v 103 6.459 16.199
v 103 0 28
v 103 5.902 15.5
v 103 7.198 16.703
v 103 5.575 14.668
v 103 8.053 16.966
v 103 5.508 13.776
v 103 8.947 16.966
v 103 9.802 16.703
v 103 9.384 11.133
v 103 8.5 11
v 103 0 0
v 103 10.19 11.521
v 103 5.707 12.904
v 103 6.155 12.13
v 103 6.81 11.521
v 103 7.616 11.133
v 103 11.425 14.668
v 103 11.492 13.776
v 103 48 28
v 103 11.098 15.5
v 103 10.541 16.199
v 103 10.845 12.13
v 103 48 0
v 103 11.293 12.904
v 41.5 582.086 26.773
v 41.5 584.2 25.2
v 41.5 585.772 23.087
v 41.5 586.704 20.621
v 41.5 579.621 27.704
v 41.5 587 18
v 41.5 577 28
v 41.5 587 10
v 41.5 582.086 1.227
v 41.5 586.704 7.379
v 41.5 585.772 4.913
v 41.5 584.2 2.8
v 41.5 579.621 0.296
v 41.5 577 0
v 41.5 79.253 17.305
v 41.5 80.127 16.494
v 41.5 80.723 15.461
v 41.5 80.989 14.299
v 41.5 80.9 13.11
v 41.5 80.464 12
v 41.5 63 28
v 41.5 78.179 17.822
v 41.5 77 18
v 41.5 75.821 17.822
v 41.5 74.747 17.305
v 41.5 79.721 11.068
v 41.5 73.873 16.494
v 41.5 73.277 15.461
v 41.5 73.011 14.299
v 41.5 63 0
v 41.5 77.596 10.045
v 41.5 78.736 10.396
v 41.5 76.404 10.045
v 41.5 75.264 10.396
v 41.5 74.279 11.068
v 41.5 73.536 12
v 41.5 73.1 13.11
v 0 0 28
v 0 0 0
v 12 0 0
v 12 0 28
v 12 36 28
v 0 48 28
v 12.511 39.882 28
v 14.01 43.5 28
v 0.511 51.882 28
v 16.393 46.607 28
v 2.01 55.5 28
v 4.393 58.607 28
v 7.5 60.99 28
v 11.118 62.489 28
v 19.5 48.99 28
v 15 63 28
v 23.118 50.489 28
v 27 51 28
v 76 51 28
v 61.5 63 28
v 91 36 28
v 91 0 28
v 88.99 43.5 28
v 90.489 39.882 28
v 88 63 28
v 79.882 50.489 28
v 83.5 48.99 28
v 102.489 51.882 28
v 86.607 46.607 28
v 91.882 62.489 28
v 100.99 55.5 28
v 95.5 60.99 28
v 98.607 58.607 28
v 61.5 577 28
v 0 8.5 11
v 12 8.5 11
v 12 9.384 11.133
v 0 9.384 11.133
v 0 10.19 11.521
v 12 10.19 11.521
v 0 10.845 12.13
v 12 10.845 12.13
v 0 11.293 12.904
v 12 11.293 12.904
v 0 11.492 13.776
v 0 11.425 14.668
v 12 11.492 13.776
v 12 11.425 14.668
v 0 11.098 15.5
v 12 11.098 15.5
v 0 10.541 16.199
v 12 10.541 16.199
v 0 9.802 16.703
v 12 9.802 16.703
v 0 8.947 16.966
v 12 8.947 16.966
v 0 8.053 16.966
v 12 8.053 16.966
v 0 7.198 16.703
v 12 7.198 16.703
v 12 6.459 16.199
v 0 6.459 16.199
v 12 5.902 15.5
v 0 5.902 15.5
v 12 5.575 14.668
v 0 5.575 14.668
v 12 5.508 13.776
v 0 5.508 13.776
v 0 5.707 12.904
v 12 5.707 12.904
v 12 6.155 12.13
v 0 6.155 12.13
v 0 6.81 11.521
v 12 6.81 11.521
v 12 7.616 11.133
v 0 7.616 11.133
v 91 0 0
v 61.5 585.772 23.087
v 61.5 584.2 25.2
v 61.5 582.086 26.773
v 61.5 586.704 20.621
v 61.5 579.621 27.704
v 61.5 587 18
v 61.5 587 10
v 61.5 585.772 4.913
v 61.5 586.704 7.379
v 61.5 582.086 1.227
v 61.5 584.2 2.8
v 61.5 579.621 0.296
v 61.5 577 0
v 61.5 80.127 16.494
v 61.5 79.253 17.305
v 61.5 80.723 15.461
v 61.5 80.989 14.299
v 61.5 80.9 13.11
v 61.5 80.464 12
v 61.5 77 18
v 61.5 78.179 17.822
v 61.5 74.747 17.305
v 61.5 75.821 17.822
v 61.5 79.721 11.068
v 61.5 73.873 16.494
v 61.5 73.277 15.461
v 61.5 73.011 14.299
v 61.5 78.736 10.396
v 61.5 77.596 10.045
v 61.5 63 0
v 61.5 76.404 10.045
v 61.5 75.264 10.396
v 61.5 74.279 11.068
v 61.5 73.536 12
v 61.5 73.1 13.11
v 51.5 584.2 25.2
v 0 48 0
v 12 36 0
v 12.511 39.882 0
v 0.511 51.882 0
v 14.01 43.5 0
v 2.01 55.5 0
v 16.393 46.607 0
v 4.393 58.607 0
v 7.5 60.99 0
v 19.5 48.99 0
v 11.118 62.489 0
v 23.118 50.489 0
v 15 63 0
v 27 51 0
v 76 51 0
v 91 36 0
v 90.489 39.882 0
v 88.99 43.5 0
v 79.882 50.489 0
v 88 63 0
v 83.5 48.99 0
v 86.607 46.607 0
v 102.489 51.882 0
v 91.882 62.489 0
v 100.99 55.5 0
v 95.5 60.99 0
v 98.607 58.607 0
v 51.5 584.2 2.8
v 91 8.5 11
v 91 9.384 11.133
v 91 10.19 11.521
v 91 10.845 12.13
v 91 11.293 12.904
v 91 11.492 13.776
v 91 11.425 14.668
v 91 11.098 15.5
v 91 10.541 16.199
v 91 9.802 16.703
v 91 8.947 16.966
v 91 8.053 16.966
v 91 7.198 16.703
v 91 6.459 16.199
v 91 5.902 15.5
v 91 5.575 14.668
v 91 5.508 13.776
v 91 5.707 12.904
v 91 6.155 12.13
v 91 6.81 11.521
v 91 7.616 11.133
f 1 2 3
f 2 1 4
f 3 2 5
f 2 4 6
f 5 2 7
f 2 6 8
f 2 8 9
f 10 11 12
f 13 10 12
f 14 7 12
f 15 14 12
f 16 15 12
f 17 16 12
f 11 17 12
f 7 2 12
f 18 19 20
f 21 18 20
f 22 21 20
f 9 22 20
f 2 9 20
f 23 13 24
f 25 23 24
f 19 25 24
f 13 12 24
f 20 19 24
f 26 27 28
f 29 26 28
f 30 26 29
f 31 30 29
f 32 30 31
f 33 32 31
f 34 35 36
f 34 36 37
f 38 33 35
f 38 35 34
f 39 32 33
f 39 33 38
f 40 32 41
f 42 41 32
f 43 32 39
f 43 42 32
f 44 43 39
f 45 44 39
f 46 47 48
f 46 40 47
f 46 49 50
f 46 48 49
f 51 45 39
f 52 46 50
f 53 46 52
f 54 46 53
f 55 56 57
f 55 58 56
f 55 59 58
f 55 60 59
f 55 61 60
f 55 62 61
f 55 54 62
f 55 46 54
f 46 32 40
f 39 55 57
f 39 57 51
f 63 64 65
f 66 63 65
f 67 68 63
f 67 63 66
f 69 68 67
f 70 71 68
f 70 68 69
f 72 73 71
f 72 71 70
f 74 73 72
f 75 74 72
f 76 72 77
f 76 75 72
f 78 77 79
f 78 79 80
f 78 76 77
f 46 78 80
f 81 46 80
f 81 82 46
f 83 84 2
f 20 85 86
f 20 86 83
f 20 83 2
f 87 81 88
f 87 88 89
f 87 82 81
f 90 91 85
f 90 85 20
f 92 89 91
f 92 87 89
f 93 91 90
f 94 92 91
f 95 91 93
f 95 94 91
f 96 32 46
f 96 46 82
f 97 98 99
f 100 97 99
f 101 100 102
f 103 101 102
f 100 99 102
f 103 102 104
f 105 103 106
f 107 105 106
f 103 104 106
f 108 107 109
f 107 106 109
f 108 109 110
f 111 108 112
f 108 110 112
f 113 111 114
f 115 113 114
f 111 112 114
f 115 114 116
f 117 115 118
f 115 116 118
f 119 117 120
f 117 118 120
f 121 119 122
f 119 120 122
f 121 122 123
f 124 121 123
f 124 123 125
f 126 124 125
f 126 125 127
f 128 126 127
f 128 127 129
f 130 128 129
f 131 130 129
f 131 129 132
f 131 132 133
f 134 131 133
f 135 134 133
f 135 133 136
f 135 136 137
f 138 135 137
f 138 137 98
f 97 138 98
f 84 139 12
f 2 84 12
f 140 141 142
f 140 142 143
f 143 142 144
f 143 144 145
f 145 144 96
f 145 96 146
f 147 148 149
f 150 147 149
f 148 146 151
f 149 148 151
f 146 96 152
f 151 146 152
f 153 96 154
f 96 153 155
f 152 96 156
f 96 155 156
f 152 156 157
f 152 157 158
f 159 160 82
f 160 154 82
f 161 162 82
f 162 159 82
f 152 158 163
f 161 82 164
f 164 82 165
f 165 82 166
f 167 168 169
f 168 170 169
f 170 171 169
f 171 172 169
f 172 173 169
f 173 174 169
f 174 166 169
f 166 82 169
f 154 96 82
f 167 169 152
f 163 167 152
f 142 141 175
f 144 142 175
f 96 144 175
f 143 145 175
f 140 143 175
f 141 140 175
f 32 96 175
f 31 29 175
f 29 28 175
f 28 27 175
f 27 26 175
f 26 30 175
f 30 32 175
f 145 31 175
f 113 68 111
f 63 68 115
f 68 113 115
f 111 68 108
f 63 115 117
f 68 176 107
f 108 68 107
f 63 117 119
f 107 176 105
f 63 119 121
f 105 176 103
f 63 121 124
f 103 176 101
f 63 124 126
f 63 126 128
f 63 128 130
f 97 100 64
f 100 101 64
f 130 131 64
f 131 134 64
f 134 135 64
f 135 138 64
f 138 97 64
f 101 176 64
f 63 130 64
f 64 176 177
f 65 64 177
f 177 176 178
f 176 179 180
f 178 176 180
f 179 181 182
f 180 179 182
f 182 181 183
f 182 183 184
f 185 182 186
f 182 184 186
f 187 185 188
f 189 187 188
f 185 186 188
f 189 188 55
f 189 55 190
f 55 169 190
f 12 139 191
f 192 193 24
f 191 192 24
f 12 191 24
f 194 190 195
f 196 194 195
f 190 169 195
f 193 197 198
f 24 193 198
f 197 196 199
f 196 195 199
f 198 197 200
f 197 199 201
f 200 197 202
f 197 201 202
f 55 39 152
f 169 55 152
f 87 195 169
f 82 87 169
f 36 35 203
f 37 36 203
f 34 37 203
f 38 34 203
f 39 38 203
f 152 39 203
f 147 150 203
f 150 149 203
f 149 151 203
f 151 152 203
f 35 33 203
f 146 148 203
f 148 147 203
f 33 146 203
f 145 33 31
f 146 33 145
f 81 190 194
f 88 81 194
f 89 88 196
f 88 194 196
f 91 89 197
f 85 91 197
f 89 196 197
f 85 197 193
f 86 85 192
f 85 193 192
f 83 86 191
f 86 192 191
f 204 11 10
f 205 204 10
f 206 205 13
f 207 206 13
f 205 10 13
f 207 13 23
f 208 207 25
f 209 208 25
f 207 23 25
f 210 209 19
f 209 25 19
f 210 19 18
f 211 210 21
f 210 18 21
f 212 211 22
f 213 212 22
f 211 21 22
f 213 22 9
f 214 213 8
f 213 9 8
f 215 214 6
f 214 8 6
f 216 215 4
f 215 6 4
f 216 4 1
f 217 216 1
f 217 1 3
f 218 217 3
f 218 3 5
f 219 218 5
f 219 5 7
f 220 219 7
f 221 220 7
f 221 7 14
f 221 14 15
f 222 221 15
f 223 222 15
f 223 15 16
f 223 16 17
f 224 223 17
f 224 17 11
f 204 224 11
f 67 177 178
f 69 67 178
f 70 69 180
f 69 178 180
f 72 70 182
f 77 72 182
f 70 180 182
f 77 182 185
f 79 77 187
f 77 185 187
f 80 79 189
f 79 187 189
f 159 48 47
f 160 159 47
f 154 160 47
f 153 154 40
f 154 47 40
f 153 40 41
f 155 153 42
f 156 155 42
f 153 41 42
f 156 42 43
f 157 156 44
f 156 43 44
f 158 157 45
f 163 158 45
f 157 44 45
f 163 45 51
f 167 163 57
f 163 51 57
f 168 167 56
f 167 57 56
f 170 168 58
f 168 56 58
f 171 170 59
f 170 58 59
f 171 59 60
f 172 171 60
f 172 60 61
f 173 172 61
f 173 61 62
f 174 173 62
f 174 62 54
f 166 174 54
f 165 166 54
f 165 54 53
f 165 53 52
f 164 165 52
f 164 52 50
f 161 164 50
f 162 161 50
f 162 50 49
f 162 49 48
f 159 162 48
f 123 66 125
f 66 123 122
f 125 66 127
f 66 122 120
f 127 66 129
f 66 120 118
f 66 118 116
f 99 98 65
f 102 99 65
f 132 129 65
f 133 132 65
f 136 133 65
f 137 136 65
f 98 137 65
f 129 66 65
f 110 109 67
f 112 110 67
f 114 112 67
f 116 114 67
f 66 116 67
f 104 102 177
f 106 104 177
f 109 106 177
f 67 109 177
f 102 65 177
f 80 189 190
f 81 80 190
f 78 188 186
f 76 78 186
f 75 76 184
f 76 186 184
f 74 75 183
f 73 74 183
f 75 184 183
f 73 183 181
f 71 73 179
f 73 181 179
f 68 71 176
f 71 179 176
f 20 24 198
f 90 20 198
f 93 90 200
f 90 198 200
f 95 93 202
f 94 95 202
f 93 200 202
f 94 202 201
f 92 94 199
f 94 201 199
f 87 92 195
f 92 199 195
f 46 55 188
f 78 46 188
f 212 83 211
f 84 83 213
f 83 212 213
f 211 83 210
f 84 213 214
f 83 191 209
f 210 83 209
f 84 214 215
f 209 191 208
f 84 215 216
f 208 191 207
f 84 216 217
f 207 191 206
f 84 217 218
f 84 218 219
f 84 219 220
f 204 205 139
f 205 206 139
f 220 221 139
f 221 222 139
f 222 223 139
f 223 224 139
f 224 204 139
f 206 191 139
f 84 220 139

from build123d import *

# Parameters (mm, degrees)
BOSS_EXTRU_1_DEPTH      = 28
ESQUISSE2_R             = 3
ENL_V_MAT_EXTRU_1_DEPTH = 124.943535531
ESQUISSE3_W             = 20
ESQUISSE3_H             = 28
BOSS_EXTRU_2_DEPTH      = 524
CONG_1_SIZE             = 10
ESQUISSE4_R             = 4
ENL_V_MAT_EXTRU_2_DEPTH = 591.876679285


with BuildPart() as part:
    # Esquisse1 → Boss.-Extru.1 (new body)
    with BuildSketch(Plane.XY):
        with BuildLine():
            Line((27, 51), (51.5, 51))
            Line((51.5, 51), (51.5, 63))
            Line((51.5, 63), (15, 63))
            ThreePointArc((15, 63), (4.393398282, 58.606601718), (0, 48))
            Line((0, 48), (0, 0))
            Line((0, 0), (12, 0))
            Line((12, 0), (12, 36))
            ThreePointArc((12, 36), (16.393398282, 46.606601718), (27, 51))
        make_face()
        with BuildLine():
            Line((51.5, 63), (51.5, 51))
            Line((51.5, 51), (76, 51))
            ThreePointArc((76, 51), (86.606601718, 46.606601718), (91, 36))
            Line((91, 36), (91, 0))
            Line((91, 0), (103, 0))
            Line((103, 0), (103, 48))
            ThreePointArc((103, 48), (98.606601718, 58.606601718), (88, 63))
            Line((88, 63), (51.5, 63))
        make_face()
    extrude(amount=BOSS_EXTRU_1_DEPTH)

    # Esquisse2 → Enlèv. mat.-Extru.1 (cut, through all)
    with BuildSketch(Plane(origin=(103, 0, 0), x_dir=(0, 0, -1), z_dir=(1, 0, 0))):
        with Locations((-14, 8.5)):
            Circle(ESQUISSE2_R)
    extrude(amount=-ENL_V_MAT_EXTRU_1_DEPTH, mode=Mode.SUBTRACT)

    # Esquisse3 → Boss.-Extru.2 (add)
    with BuildSketch(Plane(origin=(0, 63, 0), x_dir=(1, 0, 0), z_dir=(0, 1, 0))):
        with Locations((51.5, -14)):
            Rectangle(ESQUISSE3_W, ESQUISSE3_H)
    extrude(amount=BOSS_EXTRU_2_DEPTH)

    # Congé1
    # a fillet whose section is not a circle: 10 mm, written as the material it takes off along each edge
    with BuildSketch(Plane(origin=(16.5, 587, 0), x_dir=(0, -1, 0), z_dir=(1, 0, 0)), Plane(origin=(86.5, 587, 28), x_dir=(0, -1, 0), z_dir=(-1, 0, 0))) as cong_1_piece_1:
        with BuildLine():
            Bezier((CONG_1_SIZE, 0), (0, 0), (0, -CONG_1_SIZE), weights=[1, 0.785674201, 1])
            Line((0, -CONG_1_SIZE), (0, 0))
            Line((0, 0), (CONG_1_SIZE, 0))
        make_face()
    extrude(amount=70, mode=Mode.SUBTRACT)

    # Esquisse4 → Enlèv. mat.-Extru.2 (cut, through all)
    with BuildSketch(Plane.ZY.offset(-41.5)):
        with Locations((14, 77)):
            Circle(ESQUISSE4_R)
    extrude(amount=-ENL_V_MAT_EXTRU_2_DEPTH, mode=Mode.SUBTRACT)


solid = part.part
